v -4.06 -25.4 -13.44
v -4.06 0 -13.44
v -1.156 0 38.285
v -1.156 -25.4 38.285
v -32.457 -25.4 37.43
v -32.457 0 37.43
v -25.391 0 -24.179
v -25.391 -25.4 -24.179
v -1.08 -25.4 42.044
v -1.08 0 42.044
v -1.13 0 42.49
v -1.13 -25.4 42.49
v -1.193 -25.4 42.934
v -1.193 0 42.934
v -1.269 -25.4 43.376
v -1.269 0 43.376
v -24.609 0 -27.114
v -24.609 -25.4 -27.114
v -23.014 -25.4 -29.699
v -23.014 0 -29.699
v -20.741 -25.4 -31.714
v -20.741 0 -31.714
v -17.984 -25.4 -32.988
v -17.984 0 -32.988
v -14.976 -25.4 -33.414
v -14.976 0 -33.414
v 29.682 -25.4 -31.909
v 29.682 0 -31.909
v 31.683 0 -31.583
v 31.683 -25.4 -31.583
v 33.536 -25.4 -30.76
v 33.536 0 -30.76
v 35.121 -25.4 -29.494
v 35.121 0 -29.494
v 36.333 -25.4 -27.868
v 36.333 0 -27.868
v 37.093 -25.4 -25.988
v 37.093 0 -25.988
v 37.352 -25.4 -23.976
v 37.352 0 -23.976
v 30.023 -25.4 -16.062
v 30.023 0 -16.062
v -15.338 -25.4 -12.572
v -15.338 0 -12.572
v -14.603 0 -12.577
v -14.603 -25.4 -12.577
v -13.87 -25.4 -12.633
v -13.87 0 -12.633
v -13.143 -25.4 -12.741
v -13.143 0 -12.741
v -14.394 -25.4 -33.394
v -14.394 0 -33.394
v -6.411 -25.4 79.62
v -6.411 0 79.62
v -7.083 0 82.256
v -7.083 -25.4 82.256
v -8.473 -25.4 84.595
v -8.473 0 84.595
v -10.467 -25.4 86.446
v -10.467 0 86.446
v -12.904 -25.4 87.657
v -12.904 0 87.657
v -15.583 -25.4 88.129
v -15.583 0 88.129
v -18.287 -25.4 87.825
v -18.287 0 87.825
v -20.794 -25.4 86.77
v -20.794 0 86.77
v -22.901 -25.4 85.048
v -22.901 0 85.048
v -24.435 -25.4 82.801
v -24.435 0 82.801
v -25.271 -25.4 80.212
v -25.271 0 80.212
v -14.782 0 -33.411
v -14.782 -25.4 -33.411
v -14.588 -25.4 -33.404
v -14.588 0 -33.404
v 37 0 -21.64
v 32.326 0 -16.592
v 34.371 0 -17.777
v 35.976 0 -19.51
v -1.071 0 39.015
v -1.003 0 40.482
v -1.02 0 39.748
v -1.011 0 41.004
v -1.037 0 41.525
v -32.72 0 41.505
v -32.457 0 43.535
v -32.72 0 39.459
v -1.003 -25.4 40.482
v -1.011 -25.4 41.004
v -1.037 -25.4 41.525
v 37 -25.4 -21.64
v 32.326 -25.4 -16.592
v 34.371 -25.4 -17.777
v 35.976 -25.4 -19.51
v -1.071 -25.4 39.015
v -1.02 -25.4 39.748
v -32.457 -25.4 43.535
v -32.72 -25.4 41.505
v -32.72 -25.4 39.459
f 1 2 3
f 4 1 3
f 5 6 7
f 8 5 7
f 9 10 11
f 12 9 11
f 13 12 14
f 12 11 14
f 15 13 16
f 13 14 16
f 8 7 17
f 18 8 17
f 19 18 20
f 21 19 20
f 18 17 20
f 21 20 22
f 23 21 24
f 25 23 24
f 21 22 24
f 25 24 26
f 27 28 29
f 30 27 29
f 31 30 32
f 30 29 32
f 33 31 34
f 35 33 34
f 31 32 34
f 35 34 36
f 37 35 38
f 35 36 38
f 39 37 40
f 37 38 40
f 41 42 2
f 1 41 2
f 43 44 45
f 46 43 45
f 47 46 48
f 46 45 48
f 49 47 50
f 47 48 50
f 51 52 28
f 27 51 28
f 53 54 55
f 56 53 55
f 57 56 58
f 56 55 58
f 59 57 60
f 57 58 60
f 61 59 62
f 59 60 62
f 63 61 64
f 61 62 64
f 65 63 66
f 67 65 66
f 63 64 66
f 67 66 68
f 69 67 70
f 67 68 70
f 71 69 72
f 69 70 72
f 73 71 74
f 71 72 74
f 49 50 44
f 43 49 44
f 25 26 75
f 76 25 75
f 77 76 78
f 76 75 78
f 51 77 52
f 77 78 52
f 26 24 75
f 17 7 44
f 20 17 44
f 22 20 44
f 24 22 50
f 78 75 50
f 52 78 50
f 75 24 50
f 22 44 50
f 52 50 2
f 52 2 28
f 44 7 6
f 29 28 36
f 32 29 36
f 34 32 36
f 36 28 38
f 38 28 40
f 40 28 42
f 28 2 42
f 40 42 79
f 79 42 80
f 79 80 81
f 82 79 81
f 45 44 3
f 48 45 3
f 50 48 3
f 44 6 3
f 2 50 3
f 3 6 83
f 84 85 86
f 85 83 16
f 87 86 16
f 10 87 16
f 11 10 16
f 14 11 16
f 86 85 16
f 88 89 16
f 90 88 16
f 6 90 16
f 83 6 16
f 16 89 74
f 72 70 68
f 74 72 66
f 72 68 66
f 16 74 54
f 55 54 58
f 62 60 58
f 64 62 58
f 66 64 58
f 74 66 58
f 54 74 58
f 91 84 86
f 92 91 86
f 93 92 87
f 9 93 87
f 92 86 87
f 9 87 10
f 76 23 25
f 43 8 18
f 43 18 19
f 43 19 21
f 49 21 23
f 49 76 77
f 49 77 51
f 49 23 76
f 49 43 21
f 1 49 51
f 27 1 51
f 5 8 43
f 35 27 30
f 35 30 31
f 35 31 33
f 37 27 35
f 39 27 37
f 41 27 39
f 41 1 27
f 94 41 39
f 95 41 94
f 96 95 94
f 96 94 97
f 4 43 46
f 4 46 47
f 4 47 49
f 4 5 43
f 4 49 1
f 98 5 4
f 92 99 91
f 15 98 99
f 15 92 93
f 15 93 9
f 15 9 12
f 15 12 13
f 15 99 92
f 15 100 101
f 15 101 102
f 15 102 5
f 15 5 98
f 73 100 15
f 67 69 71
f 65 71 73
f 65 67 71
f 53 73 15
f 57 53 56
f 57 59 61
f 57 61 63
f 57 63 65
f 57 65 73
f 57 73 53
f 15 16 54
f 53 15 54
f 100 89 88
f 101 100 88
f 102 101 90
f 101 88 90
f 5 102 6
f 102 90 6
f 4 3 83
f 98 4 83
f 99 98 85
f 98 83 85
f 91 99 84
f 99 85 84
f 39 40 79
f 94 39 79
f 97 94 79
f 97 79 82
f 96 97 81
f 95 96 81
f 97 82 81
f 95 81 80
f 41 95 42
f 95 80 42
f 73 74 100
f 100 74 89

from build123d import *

# Parameters (mm, degrees)
F1_DEPTH = 25.4


with BuildPart() as f1:
    # F0 (on Front) → F1 (new body)
    with BuildSketch(Plane.XZ):
        with BuildLine():
            ThreePointArc((-25.270923, 80.211686), (-16.685877, 69.118101), (-6.356709, 78.609094))
            ThreePointArc((-6.356709, 78.609094), (-6.370167, 79.115242), (-6.410502, 79.61996))
            ThreePointArc((-6.410502, 79.61996), (-15.583019, 88.129409), (-25.270923, 80.211686))
        make_face()
        with BuildLine():
            ThreePointArc((-6.410502, 79.61996), (-6.370167, 79.115242), (-6.356709, 78.609094))
            ThreePointArc((-6.356709, 78.609094), (-16.685877, 69.118101), (-25.270923, 80.211686))
            Line((-25.270923, 80.211686), (-32.456549, 43.534504))
            ThreePointArc((-32.456549, 43.534504), (-16.797117, 56.357165), (-1.268692, 43.376162))
            Line((-1.268692, 43.376162), (-6.410502, 79.61996))
        make_face()
        with BuildLine():
            Line((-1.07973, 42.044204), (-1.268692, 43.376162))
            ThreePointArc((-1.268692, 43.376162), (-16.797117, 56.357165), (-32.456549, 43.534504))
            Line((-32.456549, 43.534504), (-32.456549, 37.430235))
            ThreePointArc((-32.456549, 37.430235), (-16.444514, 24.613281), (-1.155568, 38.284701))
            ThreePointArc((-1.155568, 38.284701), (-1.040974, 39.380881), (-1.002714, 40.482369))
            ThreePointArc((-1.002714, 40.482369), (-1.02198, 41.264236), (-1.07973, 42.044204))
        make_face()
        with BuildLine():
            ThreePointArc((-1.07973, 42.044204), (-1.160095, 42.712186), (-1.268692, 43.376162))
            Line((-1.268692, 43.376162), (-1.07973, 42.044204))
        make_face()
        with BuildLine():
            Line((-32.456549, 37.430235), (-32.456549, 43.534504))
            ThreePointArc((-32.456549, 43.534504), (-32.752714, 40.482369), (-32.456549, 37.430235))
        make_face()
        with BuildLine():
            ThreePointArc((-1.155568, 38.284701), (-16.444514, 24.613281), (-32.456549, 37.430235))
            Line((-32.456549, 37.430235), (-25.390898, -24.178508))
            ThreePointArc((-25.390898, -24.178508), (-22.914287, -16.16678), (-15.338004, -12.572156))
            ThreePointArc((-15.338004, -12.572156), (-14.236036, -12.598485), (-13.14301, -12.741041))
            Line((-13.14301, -12.741041), (-4.059813, -13.439911))
            Line((-4.059813, -13.439911), (-1.155568, 38.284701))
        make_face()
        with BuildLine():
            ThreePointArc((-15.338004, -12.572156), (-22.914287, -16.16678), (-25.390898, -24.178508))
            ThreePointArc((-25.390898, -24.178508), (-21.951109, -30.7895), (-14.976151, -33.413874))
            Line((-14.976151, -33.413874), (-14.393512, -33.394246))
            ThreePointArc((-14.393512, -33.394246), (-7.441734, -30.130543), (-4.612501, -22.990906))
            ThreePointArc((-4.612501, -22.990906), (-7.024118, -16.323273), (-13.14301, -12.741041))
            Line((-13.14301, -12.741041), (-15.338004, -12.572156))
        make_face()
        with BuildLine():
            Line((30.023281, -16.062297), (-4.059813, -13.439911))
            Line((-4.059813, -13.439911), (-13.14301, -12.741041))
            ThreePointArc((-13.14301, -12.741041), (-7.024118, -16.323273), (-4.612501, -22.990906))
            ThreePointArc((-4.612501, -22.990906), (-7.441734, -30.130543), (-14.393512, -33.394246))
            Line((-14.393512, -33.394246), (29.681615, -31.909406))
            ThreePointArc((29.681615, -31.909406), (21.478706, -23.805312), (30.023281, -16.062297))
        make_face()
        with BuildLine():
            Line((-14.393512, -33.394246), (-14.976151, -33.413874))
            ThreePointArc((-14.976151, -33.413874), (-14.684694, -33.408134), (-14.393512, -33.394246))
        make_face()
        with BuildLine():
            ThreePointArc((37.351861, -23.976406), (35.238329, -18.583327), (30.023281, -16.062297))
            ThreePointArc((30.023281, -16.062297), (21.478706, -23.805312), (29.681615, -31.909406))
            ThreePointArc((29.681615, -31.909406), (35.120728, -29.493769), (37.351861, -23.976406))
        make_face()
    extrude(amount=F1_DEPTH)


solid = f1.part
